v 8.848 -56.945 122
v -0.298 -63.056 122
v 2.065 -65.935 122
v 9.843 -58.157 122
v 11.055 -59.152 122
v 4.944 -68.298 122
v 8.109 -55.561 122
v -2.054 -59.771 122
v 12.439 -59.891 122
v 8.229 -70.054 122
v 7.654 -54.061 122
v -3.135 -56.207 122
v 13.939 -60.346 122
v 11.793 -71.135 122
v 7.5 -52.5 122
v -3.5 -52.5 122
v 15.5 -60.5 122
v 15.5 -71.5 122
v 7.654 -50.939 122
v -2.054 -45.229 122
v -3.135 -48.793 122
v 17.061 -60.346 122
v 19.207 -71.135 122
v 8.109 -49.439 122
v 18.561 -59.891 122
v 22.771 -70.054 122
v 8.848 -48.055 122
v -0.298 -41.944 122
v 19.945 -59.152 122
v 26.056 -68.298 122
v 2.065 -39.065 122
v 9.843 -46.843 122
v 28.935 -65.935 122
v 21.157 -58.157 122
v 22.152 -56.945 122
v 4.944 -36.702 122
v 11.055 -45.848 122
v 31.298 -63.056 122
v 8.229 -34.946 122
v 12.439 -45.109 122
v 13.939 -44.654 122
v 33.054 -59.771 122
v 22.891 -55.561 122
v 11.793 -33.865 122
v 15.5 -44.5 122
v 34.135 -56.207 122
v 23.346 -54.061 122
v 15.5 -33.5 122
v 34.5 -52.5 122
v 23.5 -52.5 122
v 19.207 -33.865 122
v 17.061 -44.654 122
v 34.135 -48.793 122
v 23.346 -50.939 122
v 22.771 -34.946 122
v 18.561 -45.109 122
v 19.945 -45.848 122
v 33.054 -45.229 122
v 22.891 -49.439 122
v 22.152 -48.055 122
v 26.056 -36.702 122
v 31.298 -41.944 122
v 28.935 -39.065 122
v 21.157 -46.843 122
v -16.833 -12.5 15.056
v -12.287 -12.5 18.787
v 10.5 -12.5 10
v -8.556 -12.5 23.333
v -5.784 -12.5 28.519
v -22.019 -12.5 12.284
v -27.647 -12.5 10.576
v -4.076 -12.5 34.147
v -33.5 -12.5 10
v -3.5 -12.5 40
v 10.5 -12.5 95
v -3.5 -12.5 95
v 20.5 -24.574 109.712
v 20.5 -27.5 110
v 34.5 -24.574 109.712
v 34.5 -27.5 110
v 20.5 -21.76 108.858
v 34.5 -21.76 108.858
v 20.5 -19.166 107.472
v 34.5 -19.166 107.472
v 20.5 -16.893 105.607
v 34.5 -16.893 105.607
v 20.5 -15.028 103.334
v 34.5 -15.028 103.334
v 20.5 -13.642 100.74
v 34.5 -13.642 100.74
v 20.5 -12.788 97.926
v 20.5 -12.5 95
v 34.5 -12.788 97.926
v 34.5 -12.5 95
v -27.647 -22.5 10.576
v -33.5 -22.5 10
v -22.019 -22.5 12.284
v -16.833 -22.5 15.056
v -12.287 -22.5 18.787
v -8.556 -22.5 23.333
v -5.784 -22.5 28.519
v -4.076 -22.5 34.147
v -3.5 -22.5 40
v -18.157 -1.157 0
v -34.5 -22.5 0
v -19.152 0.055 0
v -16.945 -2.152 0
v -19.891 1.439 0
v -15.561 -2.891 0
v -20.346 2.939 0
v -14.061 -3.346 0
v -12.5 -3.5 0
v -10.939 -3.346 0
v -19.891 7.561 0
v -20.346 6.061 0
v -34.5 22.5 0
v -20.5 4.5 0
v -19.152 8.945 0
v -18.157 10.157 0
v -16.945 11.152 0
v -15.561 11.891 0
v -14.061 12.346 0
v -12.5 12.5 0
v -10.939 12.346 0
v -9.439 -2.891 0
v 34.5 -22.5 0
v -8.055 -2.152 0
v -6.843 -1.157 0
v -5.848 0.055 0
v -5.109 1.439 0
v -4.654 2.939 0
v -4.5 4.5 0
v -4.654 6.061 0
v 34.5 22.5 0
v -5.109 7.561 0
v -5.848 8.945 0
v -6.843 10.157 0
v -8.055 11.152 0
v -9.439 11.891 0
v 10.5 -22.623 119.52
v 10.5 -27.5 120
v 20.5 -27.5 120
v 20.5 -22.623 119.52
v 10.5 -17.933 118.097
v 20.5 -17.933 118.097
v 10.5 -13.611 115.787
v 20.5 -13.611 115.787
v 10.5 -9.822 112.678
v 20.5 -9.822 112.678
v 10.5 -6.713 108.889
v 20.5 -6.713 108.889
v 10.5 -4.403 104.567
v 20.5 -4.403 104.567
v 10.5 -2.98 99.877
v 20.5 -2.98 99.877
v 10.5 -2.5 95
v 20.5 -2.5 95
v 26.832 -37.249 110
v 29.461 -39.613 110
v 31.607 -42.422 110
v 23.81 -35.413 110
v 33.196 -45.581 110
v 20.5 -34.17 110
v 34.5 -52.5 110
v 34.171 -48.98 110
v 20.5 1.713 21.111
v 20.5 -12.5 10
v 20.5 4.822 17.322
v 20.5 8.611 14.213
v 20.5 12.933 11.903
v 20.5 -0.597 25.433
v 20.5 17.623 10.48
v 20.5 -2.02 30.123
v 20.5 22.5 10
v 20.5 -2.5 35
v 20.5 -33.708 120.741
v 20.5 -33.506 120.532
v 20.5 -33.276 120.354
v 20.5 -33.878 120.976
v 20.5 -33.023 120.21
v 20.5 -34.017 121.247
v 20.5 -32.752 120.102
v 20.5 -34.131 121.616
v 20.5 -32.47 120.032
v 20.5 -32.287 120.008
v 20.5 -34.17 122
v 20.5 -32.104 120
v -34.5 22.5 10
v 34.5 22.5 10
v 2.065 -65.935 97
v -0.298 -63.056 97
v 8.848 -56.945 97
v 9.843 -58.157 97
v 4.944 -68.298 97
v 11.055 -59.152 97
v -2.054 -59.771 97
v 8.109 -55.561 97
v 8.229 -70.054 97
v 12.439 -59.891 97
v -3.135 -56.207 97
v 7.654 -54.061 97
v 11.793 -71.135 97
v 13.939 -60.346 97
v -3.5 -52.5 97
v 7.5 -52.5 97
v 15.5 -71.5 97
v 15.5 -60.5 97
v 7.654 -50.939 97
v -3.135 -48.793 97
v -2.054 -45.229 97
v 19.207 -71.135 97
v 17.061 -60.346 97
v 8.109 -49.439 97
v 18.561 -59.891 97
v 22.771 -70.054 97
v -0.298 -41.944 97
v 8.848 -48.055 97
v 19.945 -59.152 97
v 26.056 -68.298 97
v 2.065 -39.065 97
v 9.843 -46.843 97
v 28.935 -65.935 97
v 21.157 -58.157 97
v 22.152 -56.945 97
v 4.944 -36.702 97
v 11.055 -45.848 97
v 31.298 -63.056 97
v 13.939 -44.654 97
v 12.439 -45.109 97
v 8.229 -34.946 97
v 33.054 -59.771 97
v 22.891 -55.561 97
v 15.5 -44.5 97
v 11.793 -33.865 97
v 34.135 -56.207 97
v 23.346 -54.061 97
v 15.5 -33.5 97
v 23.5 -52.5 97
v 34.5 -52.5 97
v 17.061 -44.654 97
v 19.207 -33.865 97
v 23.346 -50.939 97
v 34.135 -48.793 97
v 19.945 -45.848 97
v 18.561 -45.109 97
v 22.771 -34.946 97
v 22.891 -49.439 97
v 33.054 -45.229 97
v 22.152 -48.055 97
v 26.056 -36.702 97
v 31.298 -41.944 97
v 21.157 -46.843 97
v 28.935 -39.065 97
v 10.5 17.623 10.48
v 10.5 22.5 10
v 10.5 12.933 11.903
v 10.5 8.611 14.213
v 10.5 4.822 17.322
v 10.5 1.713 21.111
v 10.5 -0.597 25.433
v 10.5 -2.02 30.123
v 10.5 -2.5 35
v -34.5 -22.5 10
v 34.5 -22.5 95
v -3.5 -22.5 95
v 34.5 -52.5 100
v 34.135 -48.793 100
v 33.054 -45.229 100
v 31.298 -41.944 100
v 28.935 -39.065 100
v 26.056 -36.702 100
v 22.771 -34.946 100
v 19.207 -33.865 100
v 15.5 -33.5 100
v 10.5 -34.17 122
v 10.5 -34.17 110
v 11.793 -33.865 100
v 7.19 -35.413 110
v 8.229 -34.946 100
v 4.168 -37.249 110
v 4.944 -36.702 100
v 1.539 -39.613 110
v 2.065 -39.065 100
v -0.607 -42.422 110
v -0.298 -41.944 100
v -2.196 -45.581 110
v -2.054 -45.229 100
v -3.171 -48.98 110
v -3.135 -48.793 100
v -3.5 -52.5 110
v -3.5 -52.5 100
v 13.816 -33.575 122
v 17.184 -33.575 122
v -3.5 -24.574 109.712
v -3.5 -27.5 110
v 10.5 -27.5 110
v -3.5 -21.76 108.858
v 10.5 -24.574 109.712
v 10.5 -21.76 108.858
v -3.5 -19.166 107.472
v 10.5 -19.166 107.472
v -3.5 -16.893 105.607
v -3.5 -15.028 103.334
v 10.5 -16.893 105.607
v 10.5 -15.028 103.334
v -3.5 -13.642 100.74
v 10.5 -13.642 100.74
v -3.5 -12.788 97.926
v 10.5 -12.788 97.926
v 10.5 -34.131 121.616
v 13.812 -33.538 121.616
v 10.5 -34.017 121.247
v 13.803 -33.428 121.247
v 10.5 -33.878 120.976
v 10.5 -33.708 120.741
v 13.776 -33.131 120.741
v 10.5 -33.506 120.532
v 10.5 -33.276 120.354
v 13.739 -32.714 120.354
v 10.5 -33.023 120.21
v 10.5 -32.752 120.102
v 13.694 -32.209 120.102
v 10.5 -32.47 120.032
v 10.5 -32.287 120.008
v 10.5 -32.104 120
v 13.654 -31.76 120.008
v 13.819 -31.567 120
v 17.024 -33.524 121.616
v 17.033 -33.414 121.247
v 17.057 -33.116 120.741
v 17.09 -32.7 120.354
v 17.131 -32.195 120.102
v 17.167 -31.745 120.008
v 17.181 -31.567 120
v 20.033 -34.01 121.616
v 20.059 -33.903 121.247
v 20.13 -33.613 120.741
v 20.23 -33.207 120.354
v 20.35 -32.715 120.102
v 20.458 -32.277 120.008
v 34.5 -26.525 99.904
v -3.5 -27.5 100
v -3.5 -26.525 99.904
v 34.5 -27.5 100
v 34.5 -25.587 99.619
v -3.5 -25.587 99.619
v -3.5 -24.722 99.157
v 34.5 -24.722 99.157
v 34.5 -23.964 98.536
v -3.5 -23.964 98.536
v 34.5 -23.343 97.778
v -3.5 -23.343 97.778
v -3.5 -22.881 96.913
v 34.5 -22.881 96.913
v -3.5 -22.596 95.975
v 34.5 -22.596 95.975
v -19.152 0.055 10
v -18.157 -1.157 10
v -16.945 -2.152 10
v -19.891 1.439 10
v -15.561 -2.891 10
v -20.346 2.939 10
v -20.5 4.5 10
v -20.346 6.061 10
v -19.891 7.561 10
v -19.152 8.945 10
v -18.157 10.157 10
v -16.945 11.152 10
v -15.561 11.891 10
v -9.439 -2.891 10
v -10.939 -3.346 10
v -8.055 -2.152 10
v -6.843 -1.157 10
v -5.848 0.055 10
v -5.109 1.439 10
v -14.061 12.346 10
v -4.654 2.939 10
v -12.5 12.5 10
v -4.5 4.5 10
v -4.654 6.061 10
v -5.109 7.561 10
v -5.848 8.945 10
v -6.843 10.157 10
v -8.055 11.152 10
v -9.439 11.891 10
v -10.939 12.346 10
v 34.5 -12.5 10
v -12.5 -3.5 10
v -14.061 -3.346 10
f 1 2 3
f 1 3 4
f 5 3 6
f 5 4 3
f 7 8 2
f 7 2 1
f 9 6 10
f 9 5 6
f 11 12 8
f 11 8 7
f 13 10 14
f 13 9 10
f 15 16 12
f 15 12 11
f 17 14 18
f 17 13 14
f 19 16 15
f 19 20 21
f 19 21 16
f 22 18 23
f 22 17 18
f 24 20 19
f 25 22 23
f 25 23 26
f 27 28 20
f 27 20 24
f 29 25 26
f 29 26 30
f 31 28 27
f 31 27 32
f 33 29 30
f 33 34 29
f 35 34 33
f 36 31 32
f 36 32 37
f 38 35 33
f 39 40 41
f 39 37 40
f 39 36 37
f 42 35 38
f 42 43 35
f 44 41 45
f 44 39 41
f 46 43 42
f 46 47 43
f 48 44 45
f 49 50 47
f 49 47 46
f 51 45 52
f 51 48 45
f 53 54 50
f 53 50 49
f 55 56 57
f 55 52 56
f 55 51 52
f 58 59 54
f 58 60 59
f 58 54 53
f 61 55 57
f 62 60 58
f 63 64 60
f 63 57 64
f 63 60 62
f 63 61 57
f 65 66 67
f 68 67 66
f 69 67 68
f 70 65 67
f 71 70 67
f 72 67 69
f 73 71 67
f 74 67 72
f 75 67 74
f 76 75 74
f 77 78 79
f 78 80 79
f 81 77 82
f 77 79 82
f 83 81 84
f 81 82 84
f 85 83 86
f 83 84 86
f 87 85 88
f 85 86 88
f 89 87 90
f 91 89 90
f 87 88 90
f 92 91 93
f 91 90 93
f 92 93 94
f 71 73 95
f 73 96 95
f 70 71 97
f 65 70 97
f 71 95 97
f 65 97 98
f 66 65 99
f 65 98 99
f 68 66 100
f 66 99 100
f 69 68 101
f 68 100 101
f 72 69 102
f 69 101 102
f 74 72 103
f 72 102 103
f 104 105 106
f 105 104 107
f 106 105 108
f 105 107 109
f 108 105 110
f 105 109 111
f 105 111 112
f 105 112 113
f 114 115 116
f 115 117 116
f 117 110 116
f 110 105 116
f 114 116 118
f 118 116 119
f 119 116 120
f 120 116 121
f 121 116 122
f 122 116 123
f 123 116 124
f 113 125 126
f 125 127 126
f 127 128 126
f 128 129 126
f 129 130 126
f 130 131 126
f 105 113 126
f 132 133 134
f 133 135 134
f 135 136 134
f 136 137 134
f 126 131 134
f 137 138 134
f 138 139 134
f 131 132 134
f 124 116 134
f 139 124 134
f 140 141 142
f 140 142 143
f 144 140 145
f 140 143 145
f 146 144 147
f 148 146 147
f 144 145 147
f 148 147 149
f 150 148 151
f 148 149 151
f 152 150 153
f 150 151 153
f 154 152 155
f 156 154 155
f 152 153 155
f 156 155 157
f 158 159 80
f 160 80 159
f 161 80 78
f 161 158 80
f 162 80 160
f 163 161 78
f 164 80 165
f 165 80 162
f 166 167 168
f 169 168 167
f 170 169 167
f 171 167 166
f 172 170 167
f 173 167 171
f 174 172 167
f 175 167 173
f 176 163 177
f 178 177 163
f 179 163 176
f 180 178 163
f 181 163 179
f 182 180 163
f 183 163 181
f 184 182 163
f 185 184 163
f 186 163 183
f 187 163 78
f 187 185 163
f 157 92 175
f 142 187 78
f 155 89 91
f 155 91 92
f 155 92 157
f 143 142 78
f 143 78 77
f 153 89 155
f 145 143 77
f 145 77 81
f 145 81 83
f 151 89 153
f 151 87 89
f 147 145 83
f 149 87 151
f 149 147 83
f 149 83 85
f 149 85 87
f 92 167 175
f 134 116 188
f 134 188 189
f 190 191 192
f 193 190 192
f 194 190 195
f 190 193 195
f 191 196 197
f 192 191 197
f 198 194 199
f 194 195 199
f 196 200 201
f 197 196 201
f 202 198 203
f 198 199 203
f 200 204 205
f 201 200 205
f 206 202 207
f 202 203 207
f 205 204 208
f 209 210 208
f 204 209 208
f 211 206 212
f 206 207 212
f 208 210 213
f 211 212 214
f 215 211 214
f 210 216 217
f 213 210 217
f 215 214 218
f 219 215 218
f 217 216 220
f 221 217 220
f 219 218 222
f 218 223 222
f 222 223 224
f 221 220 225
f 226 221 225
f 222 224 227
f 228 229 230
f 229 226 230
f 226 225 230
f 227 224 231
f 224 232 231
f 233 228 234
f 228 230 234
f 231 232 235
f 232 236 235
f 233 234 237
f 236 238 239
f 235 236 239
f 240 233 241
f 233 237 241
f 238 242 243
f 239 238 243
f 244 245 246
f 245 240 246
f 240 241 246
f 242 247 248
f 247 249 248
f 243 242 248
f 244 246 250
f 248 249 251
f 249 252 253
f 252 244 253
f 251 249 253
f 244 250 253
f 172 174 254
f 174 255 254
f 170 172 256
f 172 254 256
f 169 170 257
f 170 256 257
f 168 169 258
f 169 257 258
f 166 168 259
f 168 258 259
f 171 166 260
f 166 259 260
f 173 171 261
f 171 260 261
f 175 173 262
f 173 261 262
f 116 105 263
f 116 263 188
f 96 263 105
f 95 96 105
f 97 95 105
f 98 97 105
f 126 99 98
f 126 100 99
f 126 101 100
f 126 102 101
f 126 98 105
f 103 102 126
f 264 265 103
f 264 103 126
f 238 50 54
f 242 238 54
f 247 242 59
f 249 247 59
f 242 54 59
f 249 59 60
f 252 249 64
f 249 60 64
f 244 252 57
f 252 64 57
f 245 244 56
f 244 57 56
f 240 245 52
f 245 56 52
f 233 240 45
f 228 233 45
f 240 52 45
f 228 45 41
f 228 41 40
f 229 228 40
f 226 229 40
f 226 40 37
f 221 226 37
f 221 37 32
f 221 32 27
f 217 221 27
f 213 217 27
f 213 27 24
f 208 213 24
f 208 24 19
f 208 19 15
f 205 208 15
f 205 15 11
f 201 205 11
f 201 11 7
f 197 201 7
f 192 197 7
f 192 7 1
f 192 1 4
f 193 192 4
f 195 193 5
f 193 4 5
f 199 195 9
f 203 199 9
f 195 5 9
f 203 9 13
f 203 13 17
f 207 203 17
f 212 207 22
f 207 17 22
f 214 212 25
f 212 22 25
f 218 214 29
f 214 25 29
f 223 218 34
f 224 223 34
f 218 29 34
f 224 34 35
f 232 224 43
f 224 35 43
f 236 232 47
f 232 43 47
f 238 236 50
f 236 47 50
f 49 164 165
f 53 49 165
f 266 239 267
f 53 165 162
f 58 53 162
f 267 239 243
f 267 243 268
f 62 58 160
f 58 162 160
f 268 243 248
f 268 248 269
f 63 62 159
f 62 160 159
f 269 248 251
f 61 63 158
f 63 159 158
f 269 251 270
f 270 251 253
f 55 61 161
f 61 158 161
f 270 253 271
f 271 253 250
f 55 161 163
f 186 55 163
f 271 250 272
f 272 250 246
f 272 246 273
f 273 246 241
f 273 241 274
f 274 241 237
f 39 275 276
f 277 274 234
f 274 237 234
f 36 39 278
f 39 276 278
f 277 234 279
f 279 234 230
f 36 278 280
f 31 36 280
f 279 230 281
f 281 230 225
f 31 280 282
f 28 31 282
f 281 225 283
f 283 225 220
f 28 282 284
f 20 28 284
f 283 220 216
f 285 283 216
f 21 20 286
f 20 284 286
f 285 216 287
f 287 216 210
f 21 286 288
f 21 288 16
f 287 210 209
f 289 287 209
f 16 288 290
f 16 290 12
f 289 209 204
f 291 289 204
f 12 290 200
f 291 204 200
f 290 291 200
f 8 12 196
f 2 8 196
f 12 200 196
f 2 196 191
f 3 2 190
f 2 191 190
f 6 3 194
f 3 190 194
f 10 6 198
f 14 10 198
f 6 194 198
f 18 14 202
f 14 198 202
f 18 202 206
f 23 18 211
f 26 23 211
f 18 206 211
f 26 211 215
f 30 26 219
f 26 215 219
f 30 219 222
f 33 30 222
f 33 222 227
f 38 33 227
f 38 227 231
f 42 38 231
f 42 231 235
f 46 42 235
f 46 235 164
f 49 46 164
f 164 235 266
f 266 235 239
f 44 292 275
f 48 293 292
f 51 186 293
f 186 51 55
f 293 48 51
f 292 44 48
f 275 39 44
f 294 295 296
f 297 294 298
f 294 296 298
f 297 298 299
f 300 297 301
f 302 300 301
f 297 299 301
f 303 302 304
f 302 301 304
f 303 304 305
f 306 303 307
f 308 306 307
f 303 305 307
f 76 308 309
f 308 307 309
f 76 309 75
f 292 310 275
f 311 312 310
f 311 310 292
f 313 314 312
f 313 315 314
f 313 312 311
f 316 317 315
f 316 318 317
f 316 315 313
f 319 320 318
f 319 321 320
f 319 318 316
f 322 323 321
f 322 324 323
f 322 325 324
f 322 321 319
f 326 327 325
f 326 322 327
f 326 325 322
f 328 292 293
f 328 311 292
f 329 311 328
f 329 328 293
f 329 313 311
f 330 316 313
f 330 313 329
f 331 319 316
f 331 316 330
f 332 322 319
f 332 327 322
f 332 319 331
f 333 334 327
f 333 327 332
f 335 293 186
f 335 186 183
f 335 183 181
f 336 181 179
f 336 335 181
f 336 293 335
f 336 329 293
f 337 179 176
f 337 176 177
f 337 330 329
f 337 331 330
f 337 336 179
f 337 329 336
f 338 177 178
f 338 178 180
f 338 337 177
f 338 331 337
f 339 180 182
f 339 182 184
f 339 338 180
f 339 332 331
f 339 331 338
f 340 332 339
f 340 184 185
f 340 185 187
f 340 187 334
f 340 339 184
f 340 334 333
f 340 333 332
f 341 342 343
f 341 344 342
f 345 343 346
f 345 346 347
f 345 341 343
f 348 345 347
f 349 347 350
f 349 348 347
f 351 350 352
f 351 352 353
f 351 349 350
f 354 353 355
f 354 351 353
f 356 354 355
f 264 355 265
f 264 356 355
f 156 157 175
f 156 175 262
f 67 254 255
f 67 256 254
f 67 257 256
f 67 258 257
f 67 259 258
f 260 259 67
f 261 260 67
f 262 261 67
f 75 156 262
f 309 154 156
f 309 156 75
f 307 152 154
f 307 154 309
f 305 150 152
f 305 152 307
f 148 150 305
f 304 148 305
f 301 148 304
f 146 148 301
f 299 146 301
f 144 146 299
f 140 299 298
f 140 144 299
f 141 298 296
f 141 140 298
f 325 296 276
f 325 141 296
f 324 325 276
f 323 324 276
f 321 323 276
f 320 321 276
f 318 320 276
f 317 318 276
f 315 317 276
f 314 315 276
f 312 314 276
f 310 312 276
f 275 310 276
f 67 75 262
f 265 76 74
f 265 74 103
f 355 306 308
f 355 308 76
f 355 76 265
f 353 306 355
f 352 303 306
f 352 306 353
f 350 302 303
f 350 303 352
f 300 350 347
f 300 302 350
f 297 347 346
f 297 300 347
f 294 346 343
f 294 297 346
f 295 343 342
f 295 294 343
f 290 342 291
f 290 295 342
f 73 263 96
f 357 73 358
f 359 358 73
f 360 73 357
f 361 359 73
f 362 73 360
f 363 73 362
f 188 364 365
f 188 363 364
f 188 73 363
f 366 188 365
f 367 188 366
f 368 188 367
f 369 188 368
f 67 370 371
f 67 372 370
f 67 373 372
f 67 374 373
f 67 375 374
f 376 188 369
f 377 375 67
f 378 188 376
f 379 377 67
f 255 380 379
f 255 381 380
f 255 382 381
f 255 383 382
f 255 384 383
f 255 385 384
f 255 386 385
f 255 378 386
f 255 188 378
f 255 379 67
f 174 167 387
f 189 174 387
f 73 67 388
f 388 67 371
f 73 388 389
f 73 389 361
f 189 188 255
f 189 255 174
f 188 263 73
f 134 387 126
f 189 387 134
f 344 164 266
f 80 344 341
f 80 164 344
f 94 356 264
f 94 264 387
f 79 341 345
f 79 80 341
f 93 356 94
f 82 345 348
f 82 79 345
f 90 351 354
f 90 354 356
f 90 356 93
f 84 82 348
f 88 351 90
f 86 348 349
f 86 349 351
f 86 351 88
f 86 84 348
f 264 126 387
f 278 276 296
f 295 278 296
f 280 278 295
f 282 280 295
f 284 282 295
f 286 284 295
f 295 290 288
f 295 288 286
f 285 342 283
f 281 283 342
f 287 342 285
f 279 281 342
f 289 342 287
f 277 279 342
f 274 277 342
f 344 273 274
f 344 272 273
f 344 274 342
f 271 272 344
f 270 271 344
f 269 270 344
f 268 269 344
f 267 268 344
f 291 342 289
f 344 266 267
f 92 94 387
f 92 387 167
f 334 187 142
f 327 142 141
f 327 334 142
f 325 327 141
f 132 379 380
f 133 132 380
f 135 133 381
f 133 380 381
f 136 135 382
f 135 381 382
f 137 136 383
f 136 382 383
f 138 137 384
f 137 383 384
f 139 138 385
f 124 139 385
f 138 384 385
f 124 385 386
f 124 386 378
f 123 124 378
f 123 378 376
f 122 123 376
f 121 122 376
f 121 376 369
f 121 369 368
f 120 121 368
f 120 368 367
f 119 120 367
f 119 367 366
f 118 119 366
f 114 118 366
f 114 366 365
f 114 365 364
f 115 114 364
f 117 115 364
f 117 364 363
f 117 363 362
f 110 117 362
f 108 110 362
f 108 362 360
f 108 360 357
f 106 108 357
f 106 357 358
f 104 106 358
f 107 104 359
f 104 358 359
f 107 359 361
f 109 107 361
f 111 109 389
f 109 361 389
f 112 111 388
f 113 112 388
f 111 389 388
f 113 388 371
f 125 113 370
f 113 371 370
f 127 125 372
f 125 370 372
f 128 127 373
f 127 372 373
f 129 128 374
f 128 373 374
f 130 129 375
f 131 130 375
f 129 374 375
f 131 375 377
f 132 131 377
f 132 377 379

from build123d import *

# Parameters (mm, degrees)
SKETCH1_W                = 69
SKETCH1_H                = 45
BOSS_EXTRUDE1_DEPTH      = 10
BOSS_EXTRUDE2_DEPTH      = 12
BOSS_EXTRUDE2_DEPTH_BACK = 13
SKETCH5_R                = 19
SKETCH6_R                = 8
CUT_EXTRUDE1_DEPTH       = 146.555831213
FILLET1_R                = 25
FILLET2_R                = 15
FILLET3_R                = 5
FILLET4_R                = 2
FILLET5_R                = 25
FILLET6_R                = 30
SKETCH7_R                = 8
CUT_EXTRUDE2_DEPTH       = 138.282555338


with BuildPart() as part:
    # Sketch1 → Boss-Extrude1 (new body)
    with BuildSketch(Plane.XY):
        Rectangle(SKETCH1_W, SKETCH1_H)
    extrude(amount=BOSS_EXTRUDE1_DEPTH)

    # Sweep1: sweep along a path in Sketch3
    with BuildLine(Plane(origin=(15.5, 0, 0), x_dir=(0, 0, -1), z_dir=(1, 0, 0))) as sweep1_path:
        Line((-10, -22.5), (-100, -22.5))
        Line((-100, -22.5), (-100, -52.5))
    # Sketch4 → Sweep1 (sweep)
    with BuildSketch(Plane.XY.offset(10)):
        Polygon((34.5, -22.5), (-3.5, -22.5), (-3.5, -12.5), (10.5, -12.5), (10.5, -2.5), (20.5, -2.5), (20.5, -12.5), (34.5, -12.5), align=None)
    sweep(path=sweep1_path.line, transition=Transition.RIGHT)

    # Sketch5 → Boss-Extrude2 (add, two sides: drawn at the far end of the back side and taken through both)
    with BuildSketch(Plane.XY.offset(110).offset(-BOSS_EXTRUDE2_DEPTH_BACK)):
        with Locations((15.5, -52.5)):
            Circle(SKETCH5_R)
    extrude(amount=BOSS_EXTRUDE2_DEPTH + BOSS_EXTRUDE2_DEPTH_BACK)

    # Sketch6 → Cut-Extrude1 (cut, through all)
    with BuildSketch(Plane.XY.offset(122)):
        with Locations((15.5, -52.5)):
            Circle(SKETCH6_R)
    extrude(amount=-CUT_EXTRUDE1_DEPTH, mode=Mode.SUBTRACT)

    # Fillet1
    fillet1_edges = [part.edges().sort_by_distance(p)[0] for p in [
        (15.5, -2.5, 120),
    ]]
    fillet(fillet1_edges, radius=FILLET1_R)

    # Fillet2
    fillet2_edges = [part.edges().sort_by_distance(p)[0] for p in [
        (3.5, -12.5, 110),
        (27.5, -12.5, 110),
    ]]
    fillet(fillet2_edges, radius=FILLET2_R)

    # Fillet3
    fillet3_edges = [part.edges().sort_by_distance(p)[0] for p in [
        (15.5, -22.5, 100),
    ]]
    fillet(fillet3_edges, radius=FILLET3_R)

    # Fillet4
    fillet4_edges = [part.edges().sort_by_distance(p)[0] for p in [
        (15.5, -33.5, 120),
    ]]
    fillet(fillet4_edges, radius=FILLET4_R - 0.0001)  # a hair under: the kernel refuses the full size

    # Fillet5
    fillet5_edges = [part.edges().sort_by_distance(p)[0] for p in [
        (15.5, -2.5, 10),
    ]]
    fillet(fillet5_edges, radius=FILLET5_R - 0.0001)  # a hair under: the kernel refuses the full size

    # Fillet6
    fillet6_edges = [part.edges().sort_by_distance(p)[0] for p in [
        (-3.5, -17.5, 10),
    ]]
    fillet(fillet6_edges, radius=FILLET6_R)

    # Sketch7 → Cut-Extrude2 (cut, through all)
    with BuildSketch(Plane.XY.offset(10)):
        with Locations((-12.5, 4.5)):
            Circle(SKETCH7_R)
    extrude(amount=-CUT_EXTRUDE2_DEPTH, mode=Mode.SUBTRACT)


solid = part.part
